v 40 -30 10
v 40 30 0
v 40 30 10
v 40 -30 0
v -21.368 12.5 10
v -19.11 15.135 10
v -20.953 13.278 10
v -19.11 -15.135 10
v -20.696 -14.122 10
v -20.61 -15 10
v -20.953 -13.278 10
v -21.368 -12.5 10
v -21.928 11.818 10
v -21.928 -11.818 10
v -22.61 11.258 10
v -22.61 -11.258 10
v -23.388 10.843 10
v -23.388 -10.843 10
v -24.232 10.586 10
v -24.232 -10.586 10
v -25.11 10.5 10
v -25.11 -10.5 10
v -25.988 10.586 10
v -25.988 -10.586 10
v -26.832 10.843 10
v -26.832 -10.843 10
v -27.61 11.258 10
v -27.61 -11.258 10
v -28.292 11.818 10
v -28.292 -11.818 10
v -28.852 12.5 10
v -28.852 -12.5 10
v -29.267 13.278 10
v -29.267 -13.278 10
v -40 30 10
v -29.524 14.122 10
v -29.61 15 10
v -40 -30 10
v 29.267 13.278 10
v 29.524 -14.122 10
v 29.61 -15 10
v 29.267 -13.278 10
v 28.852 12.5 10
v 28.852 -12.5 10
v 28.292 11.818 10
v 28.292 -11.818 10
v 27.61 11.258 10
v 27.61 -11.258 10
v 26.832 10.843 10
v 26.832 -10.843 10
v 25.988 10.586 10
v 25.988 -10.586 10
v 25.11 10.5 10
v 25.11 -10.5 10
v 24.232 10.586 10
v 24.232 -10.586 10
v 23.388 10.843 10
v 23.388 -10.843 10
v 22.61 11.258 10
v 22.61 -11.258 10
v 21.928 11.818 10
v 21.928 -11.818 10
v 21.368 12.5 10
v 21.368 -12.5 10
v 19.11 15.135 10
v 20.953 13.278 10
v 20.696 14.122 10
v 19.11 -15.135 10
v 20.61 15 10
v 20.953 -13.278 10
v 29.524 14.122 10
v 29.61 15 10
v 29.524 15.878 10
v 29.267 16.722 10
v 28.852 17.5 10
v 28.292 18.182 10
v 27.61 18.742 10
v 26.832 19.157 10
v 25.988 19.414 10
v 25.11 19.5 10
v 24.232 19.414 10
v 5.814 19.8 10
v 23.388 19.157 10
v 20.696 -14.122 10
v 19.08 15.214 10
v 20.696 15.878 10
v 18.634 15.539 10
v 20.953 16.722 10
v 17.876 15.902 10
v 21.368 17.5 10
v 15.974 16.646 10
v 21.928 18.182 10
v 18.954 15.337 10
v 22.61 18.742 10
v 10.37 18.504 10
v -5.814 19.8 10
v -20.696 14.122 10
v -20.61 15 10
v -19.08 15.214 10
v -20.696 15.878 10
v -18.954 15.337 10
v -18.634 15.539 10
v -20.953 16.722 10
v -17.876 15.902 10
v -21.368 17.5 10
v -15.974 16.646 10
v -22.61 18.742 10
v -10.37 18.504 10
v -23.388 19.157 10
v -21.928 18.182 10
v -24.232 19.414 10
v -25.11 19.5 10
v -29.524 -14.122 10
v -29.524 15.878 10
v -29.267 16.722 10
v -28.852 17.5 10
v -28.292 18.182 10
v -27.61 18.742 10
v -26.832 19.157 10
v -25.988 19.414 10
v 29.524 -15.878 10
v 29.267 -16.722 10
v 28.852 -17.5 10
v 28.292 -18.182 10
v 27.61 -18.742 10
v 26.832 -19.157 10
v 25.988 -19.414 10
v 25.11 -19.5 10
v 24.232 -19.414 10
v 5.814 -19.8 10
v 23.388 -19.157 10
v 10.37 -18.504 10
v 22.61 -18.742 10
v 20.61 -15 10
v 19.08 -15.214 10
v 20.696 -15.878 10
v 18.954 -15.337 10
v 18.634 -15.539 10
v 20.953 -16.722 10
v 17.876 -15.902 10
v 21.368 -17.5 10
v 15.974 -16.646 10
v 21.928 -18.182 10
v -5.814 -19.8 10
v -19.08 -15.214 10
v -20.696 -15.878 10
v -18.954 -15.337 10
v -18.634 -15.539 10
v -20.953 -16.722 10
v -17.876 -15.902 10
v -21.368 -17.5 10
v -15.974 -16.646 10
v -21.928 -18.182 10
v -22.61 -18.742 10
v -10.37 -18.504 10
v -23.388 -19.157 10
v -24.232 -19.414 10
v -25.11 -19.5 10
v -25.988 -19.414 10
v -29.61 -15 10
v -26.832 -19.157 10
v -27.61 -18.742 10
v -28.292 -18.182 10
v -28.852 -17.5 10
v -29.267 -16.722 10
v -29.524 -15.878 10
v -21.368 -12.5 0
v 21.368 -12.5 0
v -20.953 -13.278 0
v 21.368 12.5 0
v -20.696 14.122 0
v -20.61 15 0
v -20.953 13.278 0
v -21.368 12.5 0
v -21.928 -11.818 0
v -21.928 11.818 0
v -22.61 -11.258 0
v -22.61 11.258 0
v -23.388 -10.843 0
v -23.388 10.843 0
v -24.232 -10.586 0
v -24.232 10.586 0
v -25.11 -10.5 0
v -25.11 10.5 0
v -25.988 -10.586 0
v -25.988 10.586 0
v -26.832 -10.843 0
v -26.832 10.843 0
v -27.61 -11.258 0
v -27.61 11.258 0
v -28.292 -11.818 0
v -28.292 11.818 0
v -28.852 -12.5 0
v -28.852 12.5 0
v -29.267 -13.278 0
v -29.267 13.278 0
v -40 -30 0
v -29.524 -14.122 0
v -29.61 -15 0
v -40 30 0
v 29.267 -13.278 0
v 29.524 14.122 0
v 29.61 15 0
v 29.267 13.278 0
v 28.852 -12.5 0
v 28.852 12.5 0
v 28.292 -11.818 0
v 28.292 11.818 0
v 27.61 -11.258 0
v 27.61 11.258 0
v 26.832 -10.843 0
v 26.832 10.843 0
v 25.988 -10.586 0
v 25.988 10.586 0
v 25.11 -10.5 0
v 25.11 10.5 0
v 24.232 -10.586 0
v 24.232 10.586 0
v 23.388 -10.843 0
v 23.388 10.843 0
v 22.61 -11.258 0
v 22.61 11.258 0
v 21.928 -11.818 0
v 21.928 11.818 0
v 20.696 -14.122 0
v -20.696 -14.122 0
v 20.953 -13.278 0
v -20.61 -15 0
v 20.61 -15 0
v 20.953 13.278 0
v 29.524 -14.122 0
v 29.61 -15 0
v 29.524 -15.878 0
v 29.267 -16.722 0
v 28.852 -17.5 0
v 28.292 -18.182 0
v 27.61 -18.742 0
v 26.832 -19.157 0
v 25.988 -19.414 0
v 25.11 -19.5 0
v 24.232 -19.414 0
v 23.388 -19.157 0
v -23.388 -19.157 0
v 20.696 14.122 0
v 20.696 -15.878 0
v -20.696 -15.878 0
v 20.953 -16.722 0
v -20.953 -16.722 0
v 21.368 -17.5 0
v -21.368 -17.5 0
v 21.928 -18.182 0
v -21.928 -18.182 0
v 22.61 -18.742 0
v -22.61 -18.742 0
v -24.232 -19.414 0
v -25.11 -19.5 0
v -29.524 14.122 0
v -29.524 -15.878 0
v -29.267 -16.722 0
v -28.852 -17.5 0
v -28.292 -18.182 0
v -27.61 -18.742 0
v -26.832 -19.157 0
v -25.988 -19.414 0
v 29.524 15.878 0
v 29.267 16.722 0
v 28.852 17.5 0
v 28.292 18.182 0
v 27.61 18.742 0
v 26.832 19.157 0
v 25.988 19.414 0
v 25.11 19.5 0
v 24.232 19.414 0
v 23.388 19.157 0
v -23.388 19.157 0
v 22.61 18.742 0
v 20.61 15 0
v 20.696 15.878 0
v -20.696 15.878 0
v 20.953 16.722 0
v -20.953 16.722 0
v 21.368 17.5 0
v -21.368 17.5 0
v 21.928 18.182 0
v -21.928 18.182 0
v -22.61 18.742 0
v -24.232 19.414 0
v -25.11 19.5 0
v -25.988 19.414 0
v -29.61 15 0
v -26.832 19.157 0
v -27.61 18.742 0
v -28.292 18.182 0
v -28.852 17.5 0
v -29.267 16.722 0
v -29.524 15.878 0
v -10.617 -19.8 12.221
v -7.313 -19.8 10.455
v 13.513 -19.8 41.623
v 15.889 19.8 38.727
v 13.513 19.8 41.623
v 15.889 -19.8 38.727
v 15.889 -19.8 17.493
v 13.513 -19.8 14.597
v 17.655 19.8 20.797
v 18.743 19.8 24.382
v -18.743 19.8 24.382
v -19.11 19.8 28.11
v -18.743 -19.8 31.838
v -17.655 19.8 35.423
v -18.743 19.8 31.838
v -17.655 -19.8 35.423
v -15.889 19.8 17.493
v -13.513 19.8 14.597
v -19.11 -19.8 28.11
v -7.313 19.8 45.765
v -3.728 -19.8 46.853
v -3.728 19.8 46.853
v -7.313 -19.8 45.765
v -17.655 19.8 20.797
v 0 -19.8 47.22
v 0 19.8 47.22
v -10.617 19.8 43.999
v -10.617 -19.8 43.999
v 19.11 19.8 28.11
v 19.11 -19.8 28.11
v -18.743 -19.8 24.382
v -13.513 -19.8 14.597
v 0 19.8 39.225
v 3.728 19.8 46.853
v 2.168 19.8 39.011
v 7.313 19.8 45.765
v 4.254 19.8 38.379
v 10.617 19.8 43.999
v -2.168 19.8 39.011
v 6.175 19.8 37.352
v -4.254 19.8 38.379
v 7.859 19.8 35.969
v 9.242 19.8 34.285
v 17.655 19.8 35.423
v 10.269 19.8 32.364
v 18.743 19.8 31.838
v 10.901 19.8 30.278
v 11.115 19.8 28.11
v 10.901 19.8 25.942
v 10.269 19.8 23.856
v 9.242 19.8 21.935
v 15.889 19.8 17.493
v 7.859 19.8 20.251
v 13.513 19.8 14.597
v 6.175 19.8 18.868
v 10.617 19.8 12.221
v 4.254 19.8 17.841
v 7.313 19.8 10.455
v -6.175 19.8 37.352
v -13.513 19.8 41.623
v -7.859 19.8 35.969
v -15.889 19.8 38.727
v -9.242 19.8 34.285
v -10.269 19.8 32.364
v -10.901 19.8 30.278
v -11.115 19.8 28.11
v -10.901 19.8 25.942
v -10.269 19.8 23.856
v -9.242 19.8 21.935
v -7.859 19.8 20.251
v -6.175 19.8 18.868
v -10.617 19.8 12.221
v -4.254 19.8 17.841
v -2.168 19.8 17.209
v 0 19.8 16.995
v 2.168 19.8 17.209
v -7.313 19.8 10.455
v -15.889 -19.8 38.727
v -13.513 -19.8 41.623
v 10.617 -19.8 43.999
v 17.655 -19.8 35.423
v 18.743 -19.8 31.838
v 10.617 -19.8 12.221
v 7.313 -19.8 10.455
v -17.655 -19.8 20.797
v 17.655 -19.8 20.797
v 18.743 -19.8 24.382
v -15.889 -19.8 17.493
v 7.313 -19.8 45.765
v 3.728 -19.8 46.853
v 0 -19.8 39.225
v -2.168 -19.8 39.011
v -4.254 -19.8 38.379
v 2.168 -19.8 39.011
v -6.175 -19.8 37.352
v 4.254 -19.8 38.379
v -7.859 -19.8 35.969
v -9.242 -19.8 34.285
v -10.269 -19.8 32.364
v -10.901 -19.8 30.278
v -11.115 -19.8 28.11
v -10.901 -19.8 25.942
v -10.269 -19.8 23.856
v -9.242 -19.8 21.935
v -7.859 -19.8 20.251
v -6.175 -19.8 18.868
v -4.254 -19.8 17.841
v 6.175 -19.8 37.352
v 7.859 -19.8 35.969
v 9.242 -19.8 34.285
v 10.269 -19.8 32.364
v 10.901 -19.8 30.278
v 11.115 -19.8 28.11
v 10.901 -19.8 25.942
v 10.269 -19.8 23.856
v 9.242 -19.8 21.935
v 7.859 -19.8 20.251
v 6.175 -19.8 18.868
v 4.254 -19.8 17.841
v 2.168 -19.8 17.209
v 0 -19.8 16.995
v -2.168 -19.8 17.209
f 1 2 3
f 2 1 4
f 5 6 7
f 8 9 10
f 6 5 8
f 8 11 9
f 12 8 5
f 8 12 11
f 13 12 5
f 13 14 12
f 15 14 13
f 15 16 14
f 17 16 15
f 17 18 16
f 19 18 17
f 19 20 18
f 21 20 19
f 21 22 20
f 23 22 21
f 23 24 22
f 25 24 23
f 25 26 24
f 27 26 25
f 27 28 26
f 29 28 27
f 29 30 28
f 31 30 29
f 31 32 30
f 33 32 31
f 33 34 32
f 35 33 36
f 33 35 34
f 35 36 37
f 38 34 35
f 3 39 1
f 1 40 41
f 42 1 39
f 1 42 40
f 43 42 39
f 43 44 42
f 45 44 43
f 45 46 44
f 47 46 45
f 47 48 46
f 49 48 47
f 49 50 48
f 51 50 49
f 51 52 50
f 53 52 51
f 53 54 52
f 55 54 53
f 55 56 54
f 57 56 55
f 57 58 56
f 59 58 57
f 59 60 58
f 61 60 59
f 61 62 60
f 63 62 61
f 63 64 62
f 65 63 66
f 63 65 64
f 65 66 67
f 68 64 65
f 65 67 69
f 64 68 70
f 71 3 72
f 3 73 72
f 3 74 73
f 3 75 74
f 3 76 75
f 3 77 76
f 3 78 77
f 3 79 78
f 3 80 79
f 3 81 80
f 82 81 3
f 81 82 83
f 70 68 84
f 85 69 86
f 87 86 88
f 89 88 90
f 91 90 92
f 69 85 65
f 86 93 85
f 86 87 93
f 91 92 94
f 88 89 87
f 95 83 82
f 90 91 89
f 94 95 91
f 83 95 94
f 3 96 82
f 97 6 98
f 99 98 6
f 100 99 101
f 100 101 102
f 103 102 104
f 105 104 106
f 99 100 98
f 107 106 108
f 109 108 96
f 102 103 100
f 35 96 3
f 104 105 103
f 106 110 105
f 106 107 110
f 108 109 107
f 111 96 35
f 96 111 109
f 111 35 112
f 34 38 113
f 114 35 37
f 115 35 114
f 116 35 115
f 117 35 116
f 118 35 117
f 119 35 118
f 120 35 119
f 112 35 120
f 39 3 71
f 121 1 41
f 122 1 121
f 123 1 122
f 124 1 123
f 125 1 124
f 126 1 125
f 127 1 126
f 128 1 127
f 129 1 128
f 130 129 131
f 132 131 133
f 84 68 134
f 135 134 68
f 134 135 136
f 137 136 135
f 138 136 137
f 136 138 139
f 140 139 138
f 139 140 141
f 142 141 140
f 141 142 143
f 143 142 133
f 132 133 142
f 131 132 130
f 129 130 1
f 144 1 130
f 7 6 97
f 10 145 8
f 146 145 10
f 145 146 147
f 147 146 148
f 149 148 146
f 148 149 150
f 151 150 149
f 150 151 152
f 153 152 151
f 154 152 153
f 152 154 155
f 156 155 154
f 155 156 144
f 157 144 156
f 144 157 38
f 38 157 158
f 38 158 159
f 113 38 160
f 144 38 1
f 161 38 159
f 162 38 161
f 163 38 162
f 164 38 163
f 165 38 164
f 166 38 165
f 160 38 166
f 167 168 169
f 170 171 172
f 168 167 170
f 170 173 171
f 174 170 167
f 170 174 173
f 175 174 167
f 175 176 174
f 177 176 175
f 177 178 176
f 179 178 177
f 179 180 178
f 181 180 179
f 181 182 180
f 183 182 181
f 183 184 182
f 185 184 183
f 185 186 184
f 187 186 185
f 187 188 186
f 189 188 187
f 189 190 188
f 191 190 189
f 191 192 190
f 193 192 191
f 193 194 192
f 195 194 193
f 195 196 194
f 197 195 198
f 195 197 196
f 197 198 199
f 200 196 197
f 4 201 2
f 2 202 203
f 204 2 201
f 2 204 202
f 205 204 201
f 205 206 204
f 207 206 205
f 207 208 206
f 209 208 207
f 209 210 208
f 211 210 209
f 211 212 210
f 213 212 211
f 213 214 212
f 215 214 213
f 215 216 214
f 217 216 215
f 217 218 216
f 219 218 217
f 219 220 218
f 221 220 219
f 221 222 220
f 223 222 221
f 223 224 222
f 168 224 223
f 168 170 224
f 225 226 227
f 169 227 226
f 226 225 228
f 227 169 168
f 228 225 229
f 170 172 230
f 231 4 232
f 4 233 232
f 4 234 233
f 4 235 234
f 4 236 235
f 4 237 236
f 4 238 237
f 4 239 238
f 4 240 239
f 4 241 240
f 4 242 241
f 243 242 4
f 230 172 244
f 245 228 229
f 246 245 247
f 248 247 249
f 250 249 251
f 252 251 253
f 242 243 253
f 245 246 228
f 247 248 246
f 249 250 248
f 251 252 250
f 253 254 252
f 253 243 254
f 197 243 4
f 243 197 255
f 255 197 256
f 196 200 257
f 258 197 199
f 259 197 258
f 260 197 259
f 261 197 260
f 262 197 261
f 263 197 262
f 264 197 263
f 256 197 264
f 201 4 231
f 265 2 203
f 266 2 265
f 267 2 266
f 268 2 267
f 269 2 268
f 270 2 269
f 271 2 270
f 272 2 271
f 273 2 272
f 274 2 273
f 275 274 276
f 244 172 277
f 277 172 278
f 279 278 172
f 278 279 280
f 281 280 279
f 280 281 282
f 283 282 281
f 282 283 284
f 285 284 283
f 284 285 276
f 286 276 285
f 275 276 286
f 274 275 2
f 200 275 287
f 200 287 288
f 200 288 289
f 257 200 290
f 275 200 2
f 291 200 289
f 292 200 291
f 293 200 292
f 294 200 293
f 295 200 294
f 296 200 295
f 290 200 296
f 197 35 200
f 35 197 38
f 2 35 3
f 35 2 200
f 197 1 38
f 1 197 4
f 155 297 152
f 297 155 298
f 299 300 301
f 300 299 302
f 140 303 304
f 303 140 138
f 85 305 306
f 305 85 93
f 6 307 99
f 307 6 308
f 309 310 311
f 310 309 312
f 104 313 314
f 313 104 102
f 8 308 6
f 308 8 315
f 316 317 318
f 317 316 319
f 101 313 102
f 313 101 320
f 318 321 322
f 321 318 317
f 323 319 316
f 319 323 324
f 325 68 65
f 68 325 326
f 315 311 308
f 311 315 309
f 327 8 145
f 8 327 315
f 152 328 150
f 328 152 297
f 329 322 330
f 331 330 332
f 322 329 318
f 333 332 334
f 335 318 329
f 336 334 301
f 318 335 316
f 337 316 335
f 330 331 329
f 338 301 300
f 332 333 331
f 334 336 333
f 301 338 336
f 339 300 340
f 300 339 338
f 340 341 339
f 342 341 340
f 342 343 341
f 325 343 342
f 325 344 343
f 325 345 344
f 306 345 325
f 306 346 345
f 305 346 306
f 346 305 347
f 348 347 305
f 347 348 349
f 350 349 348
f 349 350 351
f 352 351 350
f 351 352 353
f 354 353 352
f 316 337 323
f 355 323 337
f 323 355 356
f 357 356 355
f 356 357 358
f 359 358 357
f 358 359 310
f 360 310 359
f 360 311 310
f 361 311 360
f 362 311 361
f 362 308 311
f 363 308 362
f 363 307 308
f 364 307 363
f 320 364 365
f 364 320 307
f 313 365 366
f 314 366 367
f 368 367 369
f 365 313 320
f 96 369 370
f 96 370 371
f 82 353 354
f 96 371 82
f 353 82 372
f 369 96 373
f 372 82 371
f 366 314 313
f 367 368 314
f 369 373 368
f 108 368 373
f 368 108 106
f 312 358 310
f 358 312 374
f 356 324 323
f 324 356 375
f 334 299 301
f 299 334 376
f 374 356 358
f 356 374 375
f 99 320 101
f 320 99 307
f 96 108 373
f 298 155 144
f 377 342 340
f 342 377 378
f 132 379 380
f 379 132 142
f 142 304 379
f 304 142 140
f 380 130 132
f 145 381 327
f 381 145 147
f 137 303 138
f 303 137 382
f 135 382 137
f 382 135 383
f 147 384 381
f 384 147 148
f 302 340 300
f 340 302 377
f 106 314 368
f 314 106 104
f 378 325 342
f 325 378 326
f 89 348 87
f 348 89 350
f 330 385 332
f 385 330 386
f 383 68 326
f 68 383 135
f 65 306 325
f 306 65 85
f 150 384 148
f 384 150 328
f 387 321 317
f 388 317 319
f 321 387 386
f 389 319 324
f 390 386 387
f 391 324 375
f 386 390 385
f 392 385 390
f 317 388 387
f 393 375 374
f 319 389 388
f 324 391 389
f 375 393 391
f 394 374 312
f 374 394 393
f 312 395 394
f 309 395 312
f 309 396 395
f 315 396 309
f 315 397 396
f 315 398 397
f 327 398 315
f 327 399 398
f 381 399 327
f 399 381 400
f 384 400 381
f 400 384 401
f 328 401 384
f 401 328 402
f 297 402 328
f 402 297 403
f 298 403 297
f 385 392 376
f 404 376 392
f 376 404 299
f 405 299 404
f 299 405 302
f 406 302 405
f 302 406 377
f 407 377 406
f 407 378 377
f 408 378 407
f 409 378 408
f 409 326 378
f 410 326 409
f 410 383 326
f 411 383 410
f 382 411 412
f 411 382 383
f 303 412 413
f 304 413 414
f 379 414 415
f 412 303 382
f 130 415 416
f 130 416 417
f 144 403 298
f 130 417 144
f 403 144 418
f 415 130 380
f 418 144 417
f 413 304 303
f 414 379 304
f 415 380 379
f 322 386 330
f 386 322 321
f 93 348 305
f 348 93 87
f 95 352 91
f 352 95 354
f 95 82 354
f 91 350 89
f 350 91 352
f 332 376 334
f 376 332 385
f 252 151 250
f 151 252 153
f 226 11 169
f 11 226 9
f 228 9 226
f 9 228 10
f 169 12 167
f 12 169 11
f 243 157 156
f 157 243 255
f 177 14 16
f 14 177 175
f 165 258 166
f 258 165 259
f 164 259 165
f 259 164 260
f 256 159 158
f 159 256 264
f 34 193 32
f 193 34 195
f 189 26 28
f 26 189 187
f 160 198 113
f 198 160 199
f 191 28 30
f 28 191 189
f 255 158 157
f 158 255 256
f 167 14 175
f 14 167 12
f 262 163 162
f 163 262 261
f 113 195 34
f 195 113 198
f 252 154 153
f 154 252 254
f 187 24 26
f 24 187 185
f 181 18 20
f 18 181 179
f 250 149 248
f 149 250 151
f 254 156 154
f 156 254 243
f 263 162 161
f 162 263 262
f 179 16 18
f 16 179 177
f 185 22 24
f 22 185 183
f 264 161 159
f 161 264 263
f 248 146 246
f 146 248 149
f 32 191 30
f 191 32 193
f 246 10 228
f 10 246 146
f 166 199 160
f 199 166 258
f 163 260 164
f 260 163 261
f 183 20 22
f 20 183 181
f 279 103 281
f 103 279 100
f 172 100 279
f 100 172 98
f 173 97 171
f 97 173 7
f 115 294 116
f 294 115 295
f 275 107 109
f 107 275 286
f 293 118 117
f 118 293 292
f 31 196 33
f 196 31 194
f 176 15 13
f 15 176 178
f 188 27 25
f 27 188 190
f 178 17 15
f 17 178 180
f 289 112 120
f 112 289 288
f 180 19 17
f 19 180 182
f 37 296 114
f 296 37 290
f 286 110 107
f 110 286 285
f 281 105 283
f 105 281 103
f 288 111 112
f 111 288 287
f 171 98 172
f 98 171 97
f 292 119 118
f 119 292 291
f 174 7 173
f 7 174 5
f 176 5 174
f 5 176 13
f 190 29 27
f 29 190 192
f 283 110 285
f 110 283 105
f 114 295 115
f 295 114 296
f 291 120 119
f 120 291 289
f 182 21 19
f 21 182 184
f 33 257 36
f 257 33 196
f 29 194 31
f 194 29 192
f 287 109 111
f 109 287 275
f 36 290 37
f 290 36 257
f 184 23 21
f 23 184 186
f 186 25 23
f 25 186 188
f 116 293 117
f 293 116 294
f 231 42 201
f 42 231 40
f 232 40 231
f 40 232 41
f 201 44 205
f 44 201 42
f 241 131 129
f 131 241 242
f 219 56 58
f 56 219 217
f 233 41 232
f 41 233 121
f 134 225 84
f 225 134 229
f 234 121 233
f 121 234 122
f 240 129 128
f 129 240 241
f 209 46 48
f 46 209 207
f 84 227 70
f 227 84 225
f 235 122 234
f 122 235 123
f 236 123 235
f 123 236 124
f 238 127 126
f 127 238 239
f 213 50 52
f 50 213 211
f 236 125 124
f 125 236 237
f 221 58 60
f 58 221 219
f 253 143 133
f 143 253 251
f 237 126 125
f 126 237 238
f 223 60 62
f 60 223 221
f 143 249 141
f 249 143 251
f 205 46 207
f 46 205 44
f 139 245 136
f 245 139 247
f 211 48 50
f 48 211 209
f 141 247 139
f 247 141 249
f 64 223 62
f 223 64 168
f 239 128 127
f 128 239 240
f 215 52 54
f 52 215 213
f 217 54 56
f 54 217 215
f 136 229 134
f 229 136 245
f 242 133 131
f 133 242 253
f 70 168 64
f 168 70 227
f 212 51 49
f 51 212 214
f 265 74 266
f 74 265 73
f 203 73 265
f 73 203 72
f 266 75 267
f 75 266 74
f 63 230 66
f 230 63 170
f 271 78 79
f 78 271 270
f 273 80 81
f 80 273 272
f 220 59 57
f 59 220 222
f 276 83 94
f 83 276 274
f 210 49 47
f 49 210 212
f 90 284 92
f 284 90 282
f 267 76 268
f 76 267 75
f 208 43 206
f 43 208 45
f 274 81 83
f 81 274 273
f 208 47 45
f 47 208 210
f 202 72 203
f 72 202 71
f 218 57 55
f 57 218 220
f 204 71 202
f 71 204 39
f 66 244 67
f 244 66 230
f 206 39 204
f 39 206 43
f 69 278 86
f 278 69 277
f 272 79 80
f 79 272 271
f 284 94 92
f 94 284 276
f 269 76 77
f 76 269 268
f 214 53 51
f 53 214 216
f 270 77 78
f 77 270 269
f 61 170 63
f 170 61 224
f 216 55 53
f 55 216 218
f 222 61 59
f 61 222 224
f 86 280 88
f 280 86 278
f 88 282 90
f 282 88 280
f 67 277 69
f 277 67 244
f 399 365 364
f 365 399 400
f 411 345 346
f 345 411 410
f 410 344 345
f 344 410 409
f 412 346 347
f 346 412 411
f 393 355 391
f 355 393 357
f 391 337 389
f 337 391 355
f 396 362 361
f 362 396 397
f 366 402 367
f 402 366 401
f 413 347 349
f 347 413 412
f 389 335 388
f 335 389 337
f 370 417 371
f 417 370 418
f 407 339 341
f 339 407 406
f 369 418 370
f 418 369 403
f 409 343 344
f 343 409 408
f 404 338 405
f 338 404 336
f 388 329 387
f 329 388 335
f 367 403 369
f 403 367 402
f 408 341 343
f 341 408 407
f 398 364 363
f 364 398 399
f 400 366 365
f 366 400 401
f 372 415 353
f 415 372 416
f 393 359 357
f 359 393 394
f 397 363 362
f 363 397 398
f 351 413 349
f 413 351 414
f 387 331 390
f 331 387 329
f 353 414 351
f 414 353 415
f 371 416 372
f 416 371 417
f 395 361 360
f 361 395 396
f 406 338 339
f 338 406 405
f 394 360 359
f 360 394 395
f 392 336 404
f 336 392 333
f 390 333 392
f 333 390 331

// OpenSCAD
$fn = 32;

// ----------------------------------------------------------------------
// Bearing block: 80 x 60 mm base, 22.23 mm bore at 28.11 mm
// ----------------------------------------------------------------------

// --- parameters (mm) ---
base_w = 80;              // base width
base_d = 60;              // base depth
base_t = 10;              // base thickness
bore_d = 22.23;           // shaft / bearing bore
house_r = 19.11;          // housing outer radius
house_len = 39.6;         // housing length along the shaft
foot_w = 38.22;           // foot width under the housing
foot_len = 29.6;          // foot length along the shaft
axis_z = 28.11;           // bore axis height above the base
holes_d = 9;              // mounting holes
hole_x = 25.11;           // mounting hole spacing

difference() {
  union() {
    /* base plate with its underside on z = 0 */
    translate([0, 0, base_t / 2]) cube([base_w, base_d, base_t], center = true);
    /* hull foot: a straight web blending into the round housing */
    hull() {
      translate([0, 0, base_t - 0.5]) cube([foot_w, foot_len, 1.6], center = true);
      translate([0, 0, axis_z]) rotate([-90, 0, 0]) cylinder(h = house_len, d = 2 * house_r, center = true);
    }
  }
  /* bore through the housing, 2.5 mm clear on both sides */
  translate([0, 0, axis_z]) rotate([-90, 0, 0]) cylinder(h = house_len + 5, d = bore_d, center = true);
  /* mounting holes through the base plate */
  for (hx = [-25.11, 25.11]) {
    for (hy = [-15, 15]) {
      translate([hx, hy, -2.5]) cylinder(h = base_t + 5, d = holes_d);
    }
  }
}
